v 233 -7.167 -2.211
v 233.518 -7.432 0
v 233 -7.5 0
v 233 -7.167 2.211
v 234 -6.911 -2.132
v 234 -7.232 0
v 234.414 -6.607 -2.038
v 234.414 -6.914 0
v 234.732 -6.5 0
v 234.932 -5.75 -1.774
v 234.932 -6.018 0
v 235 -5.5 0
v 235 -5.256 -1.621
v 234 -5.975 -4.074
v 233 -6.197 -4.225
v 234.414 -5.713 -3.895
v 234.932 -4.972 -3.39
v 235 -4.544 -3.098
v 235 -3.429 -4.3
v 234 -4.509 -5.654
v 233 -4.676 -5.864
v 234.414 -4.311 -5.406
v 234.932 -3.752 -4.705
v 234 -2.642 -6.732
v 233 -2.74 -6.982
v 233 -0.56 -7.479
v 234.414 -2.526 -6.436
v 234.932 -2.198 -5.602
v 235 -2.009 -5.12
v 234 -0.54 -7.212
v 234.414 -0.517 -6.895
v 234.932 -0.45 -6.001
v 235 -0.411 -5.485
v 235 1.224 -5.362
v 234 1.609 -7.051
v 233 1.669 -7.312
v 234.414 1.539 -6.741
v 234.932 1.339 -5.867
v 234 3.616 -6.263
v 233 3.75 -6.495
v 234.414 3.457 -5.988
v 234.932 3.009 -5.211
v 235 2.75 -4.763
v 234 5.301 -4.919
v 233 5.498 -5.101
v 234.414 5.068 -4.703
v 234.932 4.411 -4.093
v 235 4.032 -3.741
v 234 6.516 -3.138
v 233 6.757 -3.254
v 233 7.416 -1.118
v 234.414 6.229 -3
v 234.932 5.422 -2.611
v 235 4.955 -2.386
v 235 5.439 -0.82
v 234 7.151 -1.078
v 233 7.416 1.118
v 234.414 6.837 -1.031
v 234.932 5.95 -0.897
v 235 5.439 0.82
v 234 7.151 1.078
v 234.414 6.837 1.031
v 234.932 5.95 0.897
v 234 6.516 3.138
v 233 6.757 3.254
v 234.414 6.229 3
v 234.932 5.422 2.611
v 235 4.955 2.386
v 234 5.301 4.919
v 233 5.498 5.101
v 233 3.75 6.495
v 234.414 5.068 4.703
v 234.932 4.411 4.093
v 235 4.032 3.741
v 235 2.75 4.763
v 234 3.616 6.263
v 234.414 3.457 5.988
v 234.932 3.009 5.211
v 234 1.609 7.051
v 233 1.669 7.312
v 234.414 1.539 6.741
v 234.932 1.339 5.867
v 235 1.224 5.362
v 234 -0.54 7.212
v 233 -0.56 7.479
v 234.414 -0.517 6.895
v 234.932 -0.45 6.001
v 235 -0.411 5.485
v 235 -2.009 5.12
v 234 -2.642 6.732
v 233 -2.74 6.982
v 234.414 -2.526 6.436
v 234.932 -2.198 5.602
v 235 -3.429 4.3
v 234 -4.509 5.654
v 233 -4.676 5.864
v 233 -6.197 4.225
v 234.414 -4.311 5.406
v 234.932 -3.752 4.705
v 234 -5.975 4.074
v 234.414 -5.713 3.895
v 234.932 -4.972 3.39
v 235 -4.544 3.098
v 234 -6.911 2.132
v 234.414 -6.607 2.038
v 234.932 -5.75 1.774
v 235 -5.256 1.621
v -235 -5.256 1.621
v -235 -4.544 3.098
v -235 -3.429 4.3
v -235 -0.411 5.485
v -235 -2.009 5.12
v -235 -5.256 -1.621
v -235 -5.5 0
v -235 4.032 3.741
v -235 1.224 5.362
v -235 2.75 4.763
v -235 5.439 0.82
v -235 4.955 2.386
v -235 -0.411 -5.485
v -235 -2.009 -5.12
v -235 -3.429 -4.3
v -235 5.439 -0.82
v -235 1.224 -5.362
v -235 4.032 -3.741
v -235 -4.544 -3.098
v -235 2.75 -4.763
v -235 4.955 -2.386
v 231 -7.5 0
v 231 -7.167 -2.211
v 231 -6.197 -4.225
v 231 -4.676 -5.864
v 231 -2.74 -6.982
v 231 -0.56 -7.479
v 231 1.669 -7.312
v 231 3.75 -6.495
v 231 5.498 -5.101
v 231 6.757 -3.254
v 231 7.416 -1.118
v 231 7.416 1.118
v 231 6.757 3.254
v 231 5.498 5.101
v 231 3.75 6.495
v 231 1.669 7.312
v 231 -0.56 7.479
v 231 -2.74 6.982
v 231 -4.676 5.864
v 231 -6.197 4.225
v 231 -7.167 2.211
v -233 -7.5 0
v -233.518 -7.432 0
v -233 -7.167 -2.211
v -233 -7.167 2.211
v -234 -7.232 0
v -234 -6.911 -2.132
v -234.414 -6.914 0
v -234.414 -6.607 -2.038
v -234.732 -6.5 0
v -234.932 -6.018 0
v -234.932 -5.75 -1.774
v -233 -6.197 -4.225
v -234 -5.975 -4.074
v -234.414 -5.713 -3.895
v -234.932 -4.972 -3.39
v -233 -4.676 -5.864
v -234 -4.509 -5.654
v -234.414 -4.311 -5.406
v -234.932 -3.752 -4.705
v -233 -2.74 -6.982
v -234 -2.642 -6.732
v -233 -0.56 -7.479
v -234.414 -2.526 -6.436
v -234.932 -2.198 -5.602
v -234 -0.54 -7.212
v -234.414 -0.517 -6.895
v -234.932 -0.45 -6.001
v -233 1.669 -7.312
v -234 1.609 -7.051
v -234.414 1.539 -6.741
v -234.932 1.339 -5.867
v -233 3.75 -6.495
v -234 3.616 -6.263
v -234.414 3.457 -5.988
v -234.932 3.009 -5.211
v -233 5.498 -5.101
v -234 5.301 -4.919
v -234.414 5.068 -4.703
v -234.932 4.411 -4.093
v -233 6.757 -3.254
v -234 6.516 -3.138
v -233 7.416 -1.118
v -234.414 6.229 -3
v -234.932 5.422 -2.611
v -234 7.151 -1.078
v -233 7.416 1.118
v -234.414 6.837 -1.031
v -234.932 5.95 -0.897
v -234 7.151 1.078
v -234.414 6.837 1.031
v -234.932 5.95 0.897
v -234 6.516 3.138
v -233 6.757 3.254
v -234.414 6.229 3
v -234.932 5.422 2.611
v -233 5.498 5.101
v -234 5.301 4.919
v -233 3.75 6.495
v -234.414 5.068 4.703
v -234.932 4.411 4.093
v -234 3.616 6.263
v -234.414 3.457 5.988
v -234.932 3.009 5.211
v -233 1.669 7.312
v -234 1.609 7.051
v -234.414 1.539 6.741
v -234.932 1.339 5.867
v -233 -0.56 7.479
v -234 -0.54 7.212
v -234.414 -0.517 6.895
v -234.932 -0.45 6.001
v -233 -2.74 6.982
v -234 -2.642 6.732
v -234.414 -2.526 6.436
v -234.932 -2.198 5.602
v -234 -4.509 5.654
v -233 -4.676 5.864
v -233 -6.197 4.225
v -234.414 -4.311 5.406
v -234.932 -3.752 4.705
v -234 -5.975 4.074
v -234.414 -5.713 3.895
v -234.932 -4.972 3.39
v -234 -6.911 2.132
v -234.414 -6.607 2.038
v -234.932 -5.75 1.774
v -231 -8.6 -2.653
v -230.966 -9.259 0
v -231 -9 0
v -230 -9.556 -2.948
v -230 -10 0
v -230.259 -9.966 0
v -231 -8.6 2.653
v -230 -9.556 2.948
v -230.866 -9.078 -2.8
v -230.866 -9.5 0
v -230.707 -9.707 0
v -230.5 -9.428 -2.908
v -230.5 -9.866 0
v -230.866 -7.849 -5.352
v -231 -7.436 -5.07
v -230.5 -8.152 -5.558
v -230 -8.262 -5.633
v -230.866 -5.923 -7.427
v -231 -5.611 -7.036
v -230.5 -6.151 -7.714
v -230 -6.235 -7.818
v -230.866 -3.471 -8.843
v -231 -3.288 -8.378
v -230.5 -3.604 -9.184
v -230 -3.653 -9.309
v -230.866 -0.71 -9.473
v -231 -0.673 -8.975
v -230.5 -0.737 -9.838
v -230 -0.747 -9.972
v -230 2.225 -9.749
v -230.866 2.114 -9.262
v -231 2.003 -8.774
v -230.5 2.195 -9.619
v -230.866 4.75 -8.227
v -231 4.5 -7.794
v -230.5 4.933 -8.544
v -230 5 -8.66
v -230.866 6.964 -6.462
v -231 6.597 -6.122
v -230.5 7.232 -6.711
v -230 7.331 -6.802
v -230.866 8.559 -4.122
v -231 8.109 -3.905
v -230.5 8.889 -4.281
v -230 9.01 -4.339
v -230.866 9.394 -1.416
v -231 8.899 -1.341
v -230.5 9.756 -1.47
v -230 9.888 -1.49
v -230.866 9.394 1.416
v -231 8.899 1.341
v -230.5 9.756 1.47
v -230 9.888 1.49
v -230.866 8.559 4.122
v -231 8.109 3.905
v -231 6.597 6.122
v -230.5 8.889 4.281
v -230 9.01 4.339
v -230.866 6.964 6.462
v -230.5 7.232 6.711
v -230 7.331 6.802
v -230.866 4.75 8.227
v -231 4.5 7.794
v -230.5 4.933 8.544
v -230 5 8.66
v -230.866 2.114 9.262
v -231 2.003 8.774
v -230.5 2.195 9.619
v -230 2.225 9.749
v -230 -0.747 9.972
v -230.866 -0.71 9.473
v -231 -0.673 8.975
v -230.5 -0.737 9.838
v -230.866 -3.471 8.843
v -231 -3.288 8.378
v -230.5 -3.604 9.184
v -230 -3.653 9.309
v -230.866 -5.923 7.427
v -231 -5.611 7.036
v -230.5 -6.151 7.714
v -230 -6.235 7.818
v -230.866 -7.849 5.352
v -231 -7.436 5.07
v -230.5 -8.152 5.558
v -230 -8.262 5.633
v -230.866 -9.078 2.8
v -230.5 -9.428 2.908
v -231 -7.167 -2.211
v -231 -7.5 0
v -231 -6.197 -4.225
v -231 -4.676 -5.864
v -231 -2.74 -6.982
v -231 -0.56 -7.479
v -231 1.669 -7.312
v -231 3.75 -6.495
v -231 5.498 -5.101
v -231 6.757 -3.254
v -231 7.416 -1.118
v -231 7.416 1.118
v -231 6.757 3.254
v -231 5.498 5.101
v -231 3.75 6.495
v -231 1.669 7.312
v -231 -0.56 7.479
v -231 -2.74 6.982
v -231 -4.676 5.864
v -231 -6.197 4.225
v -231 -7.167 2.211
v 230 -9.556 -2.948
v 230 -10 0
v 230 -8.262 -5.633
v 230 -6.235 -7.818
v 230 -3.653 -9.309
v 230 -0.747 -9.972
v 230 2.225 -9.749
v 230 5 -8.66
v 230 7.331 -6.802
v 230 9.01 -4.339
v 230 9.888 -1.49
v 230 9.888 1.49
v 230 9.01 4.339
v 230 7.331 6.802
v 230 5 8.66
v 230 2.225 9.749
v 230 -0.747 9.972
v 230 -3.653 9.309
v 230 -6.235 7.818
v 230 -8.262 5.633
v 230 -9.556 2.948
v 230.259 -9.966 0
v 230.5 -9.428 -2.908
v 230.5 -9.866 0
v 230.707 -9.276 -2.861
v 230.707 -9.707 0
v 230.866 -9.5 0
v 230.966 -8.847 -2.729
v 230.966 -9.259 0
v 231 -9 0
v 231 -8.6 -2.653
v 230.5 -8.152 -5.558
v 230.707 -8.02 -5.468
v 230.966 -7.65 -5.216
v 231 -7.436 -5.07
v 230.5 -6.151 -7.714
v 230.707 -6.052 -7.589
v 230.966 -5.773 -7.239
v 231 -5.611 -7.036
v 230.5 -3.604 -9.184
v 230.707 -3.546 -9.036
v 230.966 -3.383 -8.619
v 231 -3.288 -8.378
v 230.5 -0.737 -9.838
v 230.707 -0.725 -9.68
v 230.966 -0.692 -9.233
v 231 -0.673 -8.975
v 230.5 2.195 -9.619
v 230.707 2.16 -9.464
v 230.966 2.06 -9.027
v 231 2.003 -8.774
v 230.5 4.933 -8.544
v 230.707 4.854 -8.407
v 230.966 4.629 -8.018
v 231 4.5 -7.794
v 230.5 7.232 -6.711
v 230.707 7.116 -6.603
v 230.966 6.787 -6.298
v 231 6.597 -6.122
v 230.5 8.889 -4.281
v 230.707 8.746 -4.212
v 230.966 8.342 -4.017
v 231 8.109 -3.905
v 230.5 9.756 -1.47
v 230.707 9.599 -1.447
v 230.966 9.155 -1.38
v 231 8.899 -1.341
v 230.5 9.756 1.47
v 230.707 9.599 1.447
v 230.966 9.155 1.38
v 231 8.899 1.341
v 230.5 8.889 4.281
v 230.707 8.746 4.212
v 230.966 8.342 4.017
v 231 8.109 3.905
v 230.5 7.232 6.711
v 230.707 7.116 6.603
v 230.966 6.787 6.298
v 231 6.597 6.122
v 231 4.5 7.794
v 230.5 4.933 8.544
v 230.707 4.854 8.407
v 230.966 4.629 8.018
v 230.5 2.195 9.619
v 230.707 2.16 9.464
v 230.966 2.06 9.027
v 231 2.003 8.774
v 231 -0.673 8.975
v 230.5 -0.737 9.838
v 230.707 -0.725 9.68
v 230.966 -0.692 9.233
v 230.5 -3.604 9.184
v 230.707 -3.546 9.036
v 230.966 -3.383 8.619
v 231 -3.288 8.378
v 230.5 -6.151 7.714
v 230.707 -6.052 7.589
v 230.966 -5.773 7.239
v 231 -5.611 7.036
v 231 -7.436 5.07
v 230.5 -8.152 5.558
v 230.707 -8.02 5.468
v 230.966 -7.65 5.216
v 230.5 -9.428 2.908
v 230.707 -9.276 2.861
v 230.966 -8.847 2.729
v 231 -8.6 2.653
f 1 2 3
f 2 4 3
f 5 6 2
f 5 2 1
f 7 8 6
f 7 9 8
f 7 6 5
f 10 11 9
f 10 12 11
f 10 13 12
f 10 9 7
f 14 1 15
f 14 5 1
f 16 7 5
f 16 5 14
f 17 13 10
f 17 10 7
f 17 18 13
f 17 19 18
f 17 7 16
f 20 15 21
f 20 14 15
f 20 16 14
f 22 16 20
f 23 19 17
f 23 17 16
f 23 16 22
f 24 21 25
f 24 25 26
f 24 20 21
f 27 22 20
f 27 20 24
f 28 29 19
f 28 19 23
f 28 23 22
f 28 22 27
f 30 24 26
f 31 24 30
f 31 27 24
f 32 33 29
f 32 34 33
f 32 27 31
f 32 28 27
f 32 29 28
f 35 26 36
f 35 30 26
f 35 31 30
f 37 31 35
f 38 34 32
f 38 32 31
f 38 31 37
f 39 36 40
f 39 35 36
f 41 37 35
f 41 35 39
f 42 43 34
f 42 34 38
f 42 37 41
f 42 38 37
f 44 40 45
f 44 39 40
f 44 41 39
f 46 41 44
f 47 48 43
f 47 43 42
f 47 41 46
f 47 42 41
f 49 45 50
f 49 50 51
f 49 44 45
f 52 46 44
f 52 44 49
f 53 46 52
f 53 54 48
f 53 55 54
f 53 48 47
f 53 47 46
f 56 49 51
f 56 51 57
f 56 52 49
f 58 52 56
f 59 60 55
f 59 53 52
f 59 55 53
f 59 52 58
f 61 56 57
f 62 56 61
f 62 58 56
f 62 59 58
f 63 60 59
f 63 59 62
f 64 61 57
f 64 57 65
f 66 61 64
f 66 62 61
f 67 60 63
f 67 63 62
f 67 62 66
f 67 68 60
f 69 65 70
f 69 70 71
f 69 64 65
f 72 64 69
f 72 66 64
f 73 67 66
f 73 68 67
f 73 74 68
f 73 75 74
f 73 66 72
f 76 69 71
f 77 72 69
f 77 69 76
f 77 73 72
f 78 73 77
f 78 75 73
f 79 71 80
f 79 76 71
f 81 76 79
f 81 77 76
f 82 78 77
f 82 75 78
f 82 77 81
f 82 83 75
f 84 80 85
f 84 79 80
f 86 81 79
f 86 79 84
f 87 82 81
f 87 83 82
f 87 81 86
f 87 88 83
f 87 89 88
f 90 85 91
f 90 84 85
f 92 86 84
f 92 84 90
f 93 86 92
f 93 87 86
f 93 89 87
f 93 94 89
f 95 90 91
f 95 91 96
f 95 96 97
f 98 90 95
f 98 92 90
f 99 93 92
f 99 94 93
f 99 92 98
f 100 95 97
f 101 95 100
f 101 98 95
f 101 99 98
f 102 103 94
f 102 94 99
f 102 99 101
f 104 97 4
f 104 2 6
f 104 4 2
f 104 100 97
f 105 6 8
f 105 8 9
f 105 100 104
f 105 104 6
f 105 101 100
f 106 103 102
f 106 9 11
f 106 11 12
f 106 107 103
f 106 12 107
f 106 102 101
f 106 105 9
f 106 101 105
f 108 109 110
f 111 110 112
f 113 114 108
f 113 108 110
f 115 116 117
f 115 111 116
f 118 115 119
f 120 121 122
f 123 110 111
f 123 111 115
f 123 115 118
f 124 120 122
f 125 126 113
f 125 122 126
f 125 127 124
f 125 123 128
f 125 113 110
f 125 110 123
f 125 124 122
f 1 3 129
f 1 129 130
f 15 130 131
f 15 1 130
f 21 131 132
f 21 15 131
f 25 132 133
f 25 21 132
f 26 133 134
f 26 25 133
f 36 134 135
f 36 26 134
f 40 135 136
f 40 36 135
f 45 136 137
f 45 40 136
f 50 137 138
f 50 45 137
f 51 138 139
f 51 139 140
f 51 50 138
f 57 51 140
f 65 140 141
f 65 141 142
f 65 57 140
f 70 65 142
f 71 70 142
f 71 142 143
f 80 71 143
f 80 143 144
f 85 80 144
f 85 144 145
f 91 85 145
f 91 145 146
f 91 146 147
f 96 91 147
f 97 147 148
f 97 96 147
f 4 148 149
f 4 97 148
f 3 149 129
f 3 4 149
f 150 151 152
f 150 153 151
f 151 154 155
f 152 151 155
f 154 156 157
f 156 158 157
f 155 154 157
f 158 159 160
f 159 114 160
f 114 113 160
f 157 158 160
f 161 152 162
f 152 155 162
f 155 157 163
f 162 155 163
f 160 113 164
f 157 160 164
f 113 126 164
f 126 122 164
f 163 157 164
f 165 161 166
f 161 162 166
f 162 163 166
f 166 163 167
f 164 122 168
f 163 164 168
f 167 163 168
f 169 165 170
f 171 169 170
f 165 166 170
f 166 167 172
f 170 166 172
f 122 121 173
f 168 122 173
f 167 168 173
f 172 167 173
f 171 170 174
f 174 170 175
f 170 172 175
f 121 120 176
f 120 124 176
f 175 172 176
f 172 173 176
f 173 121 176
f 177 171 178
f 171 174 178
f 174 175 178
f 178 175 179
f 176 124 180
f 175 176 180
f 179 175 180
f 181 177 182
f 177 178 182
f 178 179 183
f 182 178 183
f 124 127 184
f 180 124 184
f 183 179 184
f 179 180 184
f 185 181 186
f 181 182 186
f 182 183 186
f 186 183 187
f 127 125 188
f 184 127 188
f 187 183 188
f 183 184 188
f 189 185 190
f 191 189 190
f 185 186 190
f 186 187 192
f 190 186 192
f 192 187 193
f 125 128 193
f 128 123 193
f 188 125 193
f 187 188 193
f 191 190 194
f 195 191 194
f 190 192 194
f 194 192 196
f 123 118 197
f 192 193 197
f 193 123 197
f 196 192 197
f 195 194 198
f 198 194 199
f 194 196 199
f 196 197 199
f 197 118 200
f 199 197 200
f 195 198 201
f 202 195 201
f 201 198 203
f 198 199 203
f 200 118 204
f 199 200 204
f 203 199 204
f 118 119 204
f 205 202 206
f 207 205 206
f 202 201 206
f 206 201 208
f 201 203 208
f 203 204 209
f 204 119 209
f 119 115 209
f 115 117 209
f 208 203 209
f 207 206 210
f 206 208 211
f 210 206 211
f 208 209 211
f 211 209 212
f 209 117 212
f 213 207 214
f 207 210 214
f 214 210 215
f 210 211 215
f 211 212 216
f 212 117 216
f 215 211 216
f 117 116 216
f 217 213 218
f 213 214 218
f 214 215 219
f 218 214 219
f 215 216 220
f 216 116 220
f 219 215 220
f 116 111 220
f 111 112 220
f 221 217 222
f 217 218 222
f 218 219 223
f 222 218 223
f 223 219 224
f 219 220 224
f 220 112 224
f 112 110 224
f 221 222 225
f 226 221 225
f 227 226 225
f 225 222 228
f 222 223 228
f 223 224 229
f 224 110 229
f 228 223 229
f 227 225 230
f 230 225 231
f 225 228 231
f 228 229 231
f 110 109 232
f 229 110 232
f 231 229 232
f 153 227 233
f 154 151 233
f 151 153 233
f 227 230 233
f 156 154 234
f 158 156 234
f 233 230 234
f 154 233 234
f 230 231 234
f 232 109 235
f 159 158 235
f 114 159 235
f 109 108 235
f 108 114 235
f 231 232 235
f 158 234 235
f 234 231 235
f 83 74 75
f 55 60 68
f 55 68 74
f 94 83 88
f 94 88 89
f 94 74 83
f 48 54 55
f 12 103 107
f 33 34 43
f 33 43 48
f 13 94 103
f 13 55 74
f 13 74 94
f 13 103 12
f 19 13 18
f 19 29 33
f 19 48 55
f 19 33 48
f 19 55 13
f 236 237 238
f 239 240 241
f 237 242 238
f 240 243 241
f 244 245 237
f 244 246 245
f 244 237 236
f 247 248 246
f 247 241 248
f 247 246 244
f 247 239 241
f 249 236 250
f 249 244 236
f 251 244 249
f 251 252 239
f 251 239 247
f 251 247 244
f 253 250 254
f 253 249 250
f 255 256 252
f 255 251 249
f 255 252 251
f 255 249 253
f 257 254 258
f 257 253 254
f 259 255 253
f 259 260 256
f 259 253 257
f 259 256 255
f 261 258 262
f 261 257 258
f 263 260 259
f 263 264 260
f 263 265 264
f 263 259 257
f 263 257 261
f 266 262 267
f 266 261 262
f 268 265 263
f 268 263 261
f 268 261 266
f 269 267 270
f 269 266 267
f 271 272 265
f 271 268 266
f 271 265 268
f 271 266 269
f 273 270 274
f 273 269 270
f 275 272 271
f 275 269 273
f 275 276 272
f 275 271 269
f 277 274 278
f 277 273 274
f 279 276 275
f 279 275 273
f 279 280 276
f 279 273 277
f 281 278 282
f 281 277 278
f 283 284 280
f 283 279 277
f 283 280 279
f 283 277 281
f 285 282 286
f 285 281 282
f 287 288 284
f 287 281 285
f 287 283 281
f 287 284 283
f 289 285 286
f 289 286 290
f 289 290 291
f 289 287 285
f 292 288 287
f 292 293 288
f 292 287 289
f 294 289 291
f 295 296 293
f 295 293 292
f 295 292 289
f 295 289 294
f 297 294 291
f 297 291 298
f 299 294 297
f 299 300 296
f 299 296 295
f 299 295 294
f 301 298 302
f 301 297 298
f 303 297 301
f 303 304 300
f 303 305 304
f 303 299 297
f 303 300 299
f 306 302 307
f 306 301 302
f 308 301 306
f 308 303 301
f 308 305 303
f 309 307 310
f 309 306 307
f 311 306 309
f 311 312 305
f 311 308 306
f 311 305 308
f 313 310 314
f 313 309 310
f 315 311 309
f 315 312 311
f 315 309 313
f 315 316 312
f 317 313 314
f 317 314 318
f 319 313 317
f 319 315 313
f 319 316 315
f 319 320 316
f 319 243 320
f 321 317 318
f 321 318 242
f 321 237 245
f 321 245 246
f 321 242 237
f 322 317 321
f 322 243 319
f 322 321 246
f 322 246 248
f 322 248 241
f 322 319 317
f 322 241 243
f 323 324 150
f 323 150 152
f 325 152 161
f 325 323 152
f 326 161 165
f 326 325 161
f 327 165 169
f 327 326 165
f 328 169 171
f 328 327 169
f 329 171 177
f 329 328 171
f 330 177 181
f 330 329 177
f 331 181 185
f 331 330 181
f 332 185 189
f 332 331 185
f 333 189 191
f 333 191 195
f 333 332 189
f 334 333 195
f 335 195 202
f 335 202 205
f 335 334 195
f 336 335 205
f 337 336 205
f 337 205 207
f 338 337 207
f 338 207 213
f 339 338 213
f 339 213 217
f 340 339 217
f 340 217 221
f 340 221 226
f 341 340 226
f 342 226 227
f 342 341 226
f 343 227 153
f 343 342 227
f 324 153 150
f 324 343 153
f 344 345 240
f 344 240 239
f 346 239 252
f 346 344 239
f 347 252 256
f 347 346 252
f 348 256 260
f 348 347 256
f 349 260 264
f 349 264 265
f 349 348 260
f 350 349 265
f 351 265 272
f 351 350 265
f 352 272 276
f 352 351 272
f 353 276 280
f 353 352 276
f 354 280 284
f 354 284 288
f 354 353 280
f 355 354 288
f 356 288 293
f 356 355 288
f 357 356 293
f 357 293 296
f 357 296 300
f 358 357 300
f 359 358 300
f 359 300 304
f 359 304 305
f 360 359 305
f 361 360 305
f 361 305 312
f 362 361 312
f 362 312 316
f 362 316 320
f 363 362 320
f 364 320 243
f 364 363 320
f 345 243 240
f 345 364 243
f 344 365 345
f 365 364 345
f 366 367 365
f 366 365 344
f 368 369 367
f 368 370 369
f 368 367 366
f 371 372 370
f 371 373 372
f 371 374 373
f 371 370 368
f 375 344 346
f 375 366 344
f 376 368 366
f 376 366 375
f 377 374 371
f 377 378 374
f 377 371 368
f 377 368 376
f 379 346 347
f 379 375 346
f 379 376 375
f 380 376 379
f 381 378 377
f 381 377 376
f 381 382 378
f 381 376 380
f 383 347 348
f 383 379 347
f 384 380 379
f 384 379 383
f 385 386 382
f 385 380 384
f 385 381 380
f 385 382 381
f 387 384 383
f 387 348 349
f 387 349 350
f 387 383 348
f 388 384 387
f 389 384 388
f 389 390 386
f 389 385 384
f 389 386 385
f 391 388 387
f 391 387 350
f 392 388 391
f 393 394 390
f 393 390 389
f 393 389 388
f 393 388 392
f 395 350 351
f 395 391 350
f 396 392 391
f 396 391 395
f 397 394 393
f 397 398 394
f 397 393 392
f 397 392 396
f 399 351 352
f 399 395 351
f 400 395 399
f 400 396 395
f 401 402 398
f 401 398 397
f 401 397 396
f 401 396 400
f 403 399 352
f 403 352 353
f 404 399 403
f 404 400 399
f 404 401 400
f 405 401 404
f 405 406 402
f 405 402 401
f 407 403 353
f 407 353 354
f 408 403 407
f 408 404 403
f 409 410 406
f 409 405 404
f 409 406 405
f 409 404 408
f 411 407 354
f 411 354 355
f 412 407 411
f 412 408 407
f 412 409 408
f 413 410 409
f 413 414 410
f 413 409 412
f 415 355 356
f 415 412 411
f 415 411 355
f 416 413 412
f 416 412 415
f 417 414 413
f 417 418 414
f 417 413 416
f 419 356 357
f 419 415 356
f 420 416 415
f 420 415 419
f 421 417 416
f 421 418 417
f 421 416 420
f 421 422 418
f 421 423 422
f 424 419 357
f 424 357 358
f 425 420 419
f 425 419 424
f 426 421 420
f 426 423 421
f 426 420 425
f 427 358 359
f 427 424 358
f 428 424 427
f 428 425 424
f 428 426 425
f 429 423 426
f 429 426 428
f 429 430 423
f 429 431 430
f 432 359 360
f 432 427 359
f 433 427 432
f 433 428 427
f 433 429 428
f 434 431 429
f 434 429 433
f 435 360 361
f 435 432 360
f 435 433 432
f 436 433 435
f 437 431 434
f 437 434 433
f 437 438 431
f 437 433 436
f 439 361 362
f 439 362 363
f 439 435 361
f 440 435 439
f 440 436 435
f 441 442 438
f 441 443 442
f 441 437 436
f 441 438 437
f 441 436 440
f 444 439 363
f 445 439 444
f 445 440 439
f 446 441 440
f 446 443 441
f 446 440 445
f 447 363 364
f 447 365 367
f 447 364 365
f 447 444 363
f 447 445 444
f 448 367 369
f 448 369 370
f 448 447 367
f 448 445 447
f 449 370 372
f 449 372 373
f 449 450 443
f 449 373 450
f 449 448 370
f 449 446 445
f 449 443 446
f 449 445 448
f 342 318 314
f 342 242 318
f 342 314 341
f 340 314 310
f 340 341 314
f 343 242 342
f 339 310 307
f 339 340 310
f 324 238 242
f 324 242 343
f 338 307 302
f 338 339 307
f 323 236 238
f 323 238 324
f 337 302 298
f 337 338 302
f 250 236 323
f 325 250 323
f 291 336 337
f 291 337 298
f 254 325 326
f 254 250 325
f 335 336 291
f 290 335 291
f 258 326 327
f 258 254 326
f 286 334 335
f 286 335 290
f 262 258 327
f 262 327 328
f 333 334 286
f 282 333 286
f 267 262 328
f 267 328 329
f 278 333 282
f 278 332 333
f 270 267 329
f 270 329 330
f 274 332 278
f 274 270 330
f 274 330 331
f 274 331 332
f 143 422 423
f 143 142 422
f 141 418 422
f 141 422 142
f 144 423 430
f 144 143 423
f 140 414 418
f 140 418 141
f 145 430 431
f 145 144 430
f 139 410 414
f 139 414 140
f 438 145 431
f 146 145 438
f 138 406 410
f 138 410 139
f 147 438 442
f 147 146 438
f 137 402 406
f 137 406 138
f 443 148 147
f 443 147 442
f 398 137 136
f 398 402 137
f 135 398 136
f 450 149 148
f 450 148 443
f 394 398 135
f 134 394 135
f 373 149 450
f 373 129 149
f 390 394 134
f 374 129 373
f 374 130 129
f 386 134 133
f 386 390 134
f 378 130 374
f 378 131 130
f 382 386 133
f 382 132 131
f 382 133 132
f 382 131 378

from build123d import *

# Parameters (mm, degrees)
RADYUS1_R = 1
RADYUS2_R = 2


with BuildPart() as part:
    # Çizim1 → Döndür1 (revolve)
    with BuildSketch(Plane.XY, mode=Mode.PRIVATE) as d_nd_r1_sk:
        Polygon((-235, 0), (-235, 7.5), (-231, 7.5), (-231, 10), (231, 10), (231, 7.5), (235, 7.5), (235, 0), align=None)
    revolve(d_nd_r1_sk.sketch.rotate(Axis((-235, 0, 0), (1, 0, 0)), 180), axis=Axis((-235, 0, 0), (1, 0, 0)))

    # Radyus1
    radyus1_edges = [part.edges().sort_by_distance(p)[0] for p in [
        (231, 10, 0),
        (-231, 10, 0),
    ]]
    fillet(radyus1_edges, radius=RADYUS1_R)

    # Radyus2
    radyus2_edges = [part.edges().sort_by_distance(p)[0] for p in [
        (235, 7.5, 0),
        (-235, 7.5, 0),
    ]]
    fillet(radyus2_edges, radius=RADYUS2_R)


solid = part.part
